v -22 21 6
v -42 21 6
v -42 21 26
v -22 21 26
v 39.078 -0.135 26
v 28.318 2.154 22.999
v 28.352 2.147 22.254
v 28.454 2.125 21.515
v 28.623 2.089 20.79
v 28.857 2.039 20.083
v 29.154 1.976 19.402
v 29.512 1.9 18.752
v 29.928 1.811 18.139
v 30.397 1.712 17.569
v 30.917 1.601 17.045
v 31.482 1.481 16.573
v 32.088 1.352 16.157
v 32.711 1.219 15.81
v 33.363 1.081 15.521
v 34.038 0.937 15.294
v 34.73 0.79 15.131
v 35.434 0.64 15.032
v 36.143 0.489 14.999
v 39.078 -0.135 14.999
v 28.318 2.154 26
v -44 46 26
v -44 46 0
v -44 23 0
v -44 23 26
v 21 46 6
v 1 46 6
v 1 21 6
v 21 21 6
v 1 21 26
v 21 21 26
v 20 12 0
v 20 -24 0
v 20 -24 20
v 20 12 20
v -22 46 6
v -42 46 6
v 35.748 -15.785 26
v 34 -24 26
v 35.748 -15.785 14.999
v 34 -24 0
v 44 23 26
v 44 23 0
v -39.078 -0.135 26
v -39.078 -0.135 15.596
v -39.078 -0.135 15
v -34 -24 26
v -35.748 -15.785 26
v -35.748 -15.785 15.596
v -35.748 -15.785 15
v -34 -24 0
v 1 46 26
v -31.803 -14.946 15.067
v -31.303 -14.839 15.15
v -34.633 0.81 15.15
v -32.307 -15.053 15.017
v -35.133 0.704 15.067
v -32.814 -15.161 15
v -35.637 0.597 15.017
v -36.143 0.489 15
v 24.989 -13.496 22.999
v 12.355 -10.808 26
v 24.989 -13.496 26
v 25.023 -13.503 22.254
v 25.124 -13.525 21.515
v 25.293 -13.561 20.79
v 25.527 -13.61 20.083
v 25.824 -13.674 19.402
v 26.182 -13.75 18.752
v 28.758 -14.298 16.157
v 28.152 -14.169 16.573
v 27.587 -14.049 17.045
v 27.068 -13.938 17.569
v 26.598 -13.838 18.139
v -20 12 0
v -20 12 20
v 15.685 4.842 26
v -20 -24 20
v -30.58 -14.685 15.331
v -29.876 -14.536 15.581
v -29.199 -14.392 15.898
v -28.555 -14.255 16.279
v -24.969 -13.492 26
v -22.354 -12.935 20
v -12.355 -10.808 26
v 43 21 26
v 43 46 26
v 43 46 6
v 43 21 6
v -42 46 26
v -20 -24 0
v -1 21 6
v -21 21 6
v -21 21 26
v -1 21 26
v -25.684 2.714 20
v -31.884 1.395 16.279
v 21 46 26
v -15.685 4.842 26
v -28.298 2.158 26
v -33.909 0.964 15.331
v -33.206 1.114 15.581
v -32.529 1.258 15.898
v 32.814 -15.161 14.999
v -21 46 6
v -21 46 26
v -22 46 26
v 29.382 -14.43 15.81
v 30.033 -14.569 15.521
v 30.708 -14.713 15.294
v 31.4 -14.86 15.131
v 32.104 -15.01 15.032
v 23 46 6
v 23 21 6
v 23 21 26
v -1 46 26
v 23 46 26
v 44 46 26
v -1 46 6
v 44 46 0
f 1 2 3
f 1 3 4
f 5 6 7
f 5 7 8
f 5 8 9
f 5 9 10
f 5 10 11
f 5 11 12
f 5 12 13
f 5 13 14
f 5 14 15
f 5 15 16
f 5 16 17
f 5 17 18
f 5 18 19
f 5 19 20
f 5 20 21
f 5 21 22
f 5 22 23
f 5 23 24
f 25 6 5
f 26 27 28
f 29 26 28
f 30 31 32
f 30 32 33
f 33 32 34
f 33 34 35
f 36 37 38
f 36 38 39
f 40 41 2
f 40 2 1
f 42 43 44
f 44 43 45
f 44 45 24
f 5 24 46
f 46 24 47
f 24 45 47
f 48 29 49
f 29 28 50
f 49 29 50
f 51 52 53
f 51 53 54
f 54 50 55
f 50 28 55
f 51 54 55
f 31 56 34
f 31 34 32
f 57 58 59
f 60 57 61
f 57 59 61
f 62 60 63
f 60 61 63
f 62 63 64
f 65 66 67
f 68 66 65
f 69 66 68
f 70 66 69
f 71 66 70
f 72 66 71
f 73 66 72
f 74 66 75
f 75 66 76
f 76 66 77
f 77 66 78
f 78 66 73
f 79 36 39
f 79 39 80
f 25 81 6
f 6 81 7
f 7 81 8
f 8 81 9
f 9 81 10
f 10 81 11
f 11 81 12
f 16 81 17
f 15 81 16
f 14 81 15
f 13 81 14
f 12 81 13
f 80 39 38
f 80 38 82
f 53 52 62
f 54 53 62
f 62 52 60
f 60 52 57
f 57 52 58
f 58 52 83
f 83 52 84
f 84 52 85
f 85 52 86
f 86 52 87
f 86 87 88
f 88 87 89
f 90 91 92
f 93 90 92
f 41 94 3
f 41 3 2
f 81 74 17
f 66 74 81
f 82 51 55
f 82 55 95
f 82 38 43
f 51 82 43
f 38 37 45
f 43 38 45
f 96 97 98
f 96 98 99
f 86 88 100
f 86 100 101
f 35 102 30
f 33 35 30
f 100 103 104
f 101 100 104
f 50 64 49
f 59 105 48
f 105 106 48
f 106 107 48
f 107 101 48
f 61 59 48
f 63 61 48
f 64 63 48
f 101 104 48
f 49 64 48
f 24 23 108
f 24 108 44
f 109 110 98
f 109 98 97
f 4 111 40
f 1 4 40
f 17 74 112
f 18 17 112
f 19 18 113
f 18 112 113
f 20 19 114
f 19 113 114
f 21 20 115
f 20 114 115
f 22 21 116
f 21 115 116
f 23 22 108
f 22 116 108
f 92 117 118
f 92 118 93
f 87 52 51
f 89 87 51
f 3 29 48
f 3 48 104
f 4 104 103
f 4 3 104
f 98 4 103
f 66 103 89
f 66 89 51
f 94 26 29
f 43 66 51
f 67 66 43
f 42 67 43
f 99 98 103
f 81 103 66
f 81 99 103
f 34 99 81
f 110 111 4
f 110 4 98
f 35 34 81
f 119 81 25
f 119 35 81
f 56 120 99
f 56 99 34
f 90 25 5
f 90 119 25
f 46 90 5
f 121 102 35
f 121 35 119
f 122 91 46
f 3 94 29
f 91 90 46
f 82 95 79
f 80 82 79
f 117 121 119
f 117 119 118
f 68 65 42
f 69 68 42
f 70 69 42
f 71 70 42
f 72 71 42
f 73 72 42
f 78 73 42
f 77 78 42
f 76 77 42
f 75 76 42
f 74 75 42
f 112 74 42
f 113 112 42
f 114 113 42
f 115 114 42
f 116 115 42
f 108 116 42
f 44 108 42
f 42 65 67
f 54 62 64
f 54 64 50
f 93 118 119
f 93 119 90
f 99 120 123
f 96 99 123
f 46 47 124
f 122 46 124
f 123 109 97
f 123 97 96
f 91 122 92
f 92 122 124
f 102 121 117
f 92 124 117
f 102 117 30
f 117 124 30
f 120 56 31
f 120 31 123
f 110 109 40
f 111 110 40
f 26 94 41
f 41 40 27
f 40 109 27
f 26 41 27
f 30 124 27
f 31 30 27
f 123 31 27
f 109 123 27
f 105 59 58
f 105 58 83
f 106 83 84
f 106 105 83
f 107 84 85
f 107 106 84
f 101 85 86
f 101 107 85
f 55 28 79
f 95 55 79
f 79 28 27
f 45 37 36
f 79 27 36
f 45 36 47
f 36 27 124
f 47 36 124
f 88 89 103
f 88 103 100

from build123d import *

# Parameters (mm, degrees)
EXTRUDE_1_DEPTH     = 26
SKETCH_3_W          = 40
SKETCH_3_H          = 36
CUT_EXTRUDE_4_DEPTH = 20
SKETCH_4_W          = 20
SKETCH_4_H          = 20
CUT_EXTRUDE_5_DEPTH = 25
CUT_EXTRUDE_3_DEPTH = 8
CUT_EXTRUDE_6_DEPTH = 8
CUT_EXTRUDE_7_DEPTH = 16
CUT_EXTRUDE_8_DEPTH = 16


with BuildPart() as part:
    # 草图1 → 凸台-拉伸1 (new body)
    with BuildSketch(Plane.XY):
        Polygon((-34, -24), (34, -24), (44, 23), (44, 46), (-44, 46), (-44, 23), align=None)
    extrude(amount=EXTRUDE_1_DEPTH)

    # 草图3 → 切除-拉伸4 (cut)
    with BuildSketch(Plane(origin=(0, 0, 0), x_dir=(-1, 0, 0), z_dir=(0, 0, -1))):
        with Locations((0, -6)):
            Rectangle(SKETCH_3_W, SKETCH_3_H)
    extrude(amount=-CUT_EXTRUDE_4_DEPTH, mode=Mode.SUBTRACT)

    # 草图4 → 切除-拉伸5 (cut)
    with BuildSketch(Plane(origin=(0, 46, 0), x_dir=(1, 0, 0), z_dir=(0, 1, 0))):
        with Locations((33, -16)):
            Rectangle(SKETCH_4_W, SKETCH_4_H)
        with Locations((11, -16)):
            Rectangle(SKETCH_4_W, SKETCH_4_H)
        with Locations((-11, -16)):
            Rectangle(SKETCH_4_W, SKETCH_4_H)
        with Locations((-32, -16)):
            Rectangle(SKETCH_4_W, SKETCH_4_H)
    extrude(amount=-CUT_EXTRUDE_5_DEPTH, mode=Mode.SUBTRACT)

    # Sketch 3D_5 → 切除-拉伸3 (cut, symmetric)
    with BuildSketch(Plane(origin=(-26.633413551, -5.666683734, 23.004025099), x_dir=(-0.691625335103945, -0.14715432661786076, 0.7071067811865475), z_dir=(-0.2081076444648591, 0.9781059289848354, 0))):
        with BuildLine():
            Line((0, 0), (5.656854249, 5.656854249))
            Line((5.656854249, 5.656854249), (11.313708499, 0))
            ThreePointArc((11.313708499, 0), (5.656854249, -13.656854249), (0, 0))
        make_face()
    extrude(amount=CUT_EXTRUDE_3_DEPTH, both=True, mode=Mode.SUBTRACT)

    # Sketch 3D_6 → 切除-拉伸6 (cut, symmetric)
    with BuildSketch(Plane(origin=(34.478414998, -7.335832978, 14.99907516), x_dir=(0.5895982688198705, -0.12544644017993214, 0.7978954016979886), z_dir=(-0.20810764446495697, -0.9781059289848145, -6.6559639472978385e-12))):
        with BuildLine():
            Line((0, 0), (6.376045072, -8.439700449))
            Line((6.376045072, -8.439700449), (17.547318622, 0))
            Line((17.547318622, 0), (11.17127355, 8.439700449))
            Line((11.17127355, 8.439700449), (6.348906145, 14.822863662))
            Line((6.348906145, 14.822863662), (1.560795809, 11.205530619))
            ThreePointArc((1.560795809, 11.205530619), (-1.540343474, 5.926016705), (0, 0))
        make_face()
    extrude(amount=CUT_EXTRUDE_6_DEPTH, both=True, mode=Mode.SUBTRACT)

    # 草图7 → 切除-拉伸7 (cut)
    with BuildSketch(Plane(origin=(-1.664861156, 7.824847432, 0), x_dir=(0.9781059289848355, 0.2081076444648587, 0), z_dir=(0.2081076444648587, -0.9781059289848355, 0))):
        with BuildLine():
            Line((-24.556702047, 20), (-31.200844281, 16.10051891))
            ThreePointArc((-31.200844281, 16.10051891), (-33.152072653, 15.280030806), (-35.250185053, 15))
            Line((-35.250185053, 15), (-43.250185053, 15))
            Line((-43.250185053, 15), (-43.250185053, 23))
            ThreePointArc((-43.250185053, 23), (-40.3181561, 29.189965223), (-33.671267687, 30.842641134))
            Line((-33.671267687, 30.842641134), (-10.087245225, 28.492198282))
            Line((-10.087245225, 28.492198282), (-24.556702047, 20))
        make_face()
    extrude(amount=CUT_EXTRUDE_7_DEPTH, mode=Mode.SUBTRACT)

    # 草图11 → 切除-拉伸8 (cut)
    with BuildSketch(Plane(origin=(-1.664861156, -7.824847432, 0), x_dir=(0.9781059289845859, -0.2081076444660318, -1.1269708570671002e-12), z_dir=(0.20810764446603178, 0.9781059289845858, 5.296763028184159e-12))):
        with BuildLine():
            Line((31.200844283, -16.100518909), (14.333584528, -26))
            Line((14.333584528, -26), (32.666556858, -30.571318601))
            ThreePointArc((32.666556858, -30.571318601), (42.196349228, -26.968728166), (40.460809076, -16.92962956))
            Line((40.460809076, -16.92962956), (38.250185053, -14.99907516))
            Line((38.250185053, -14.99907516), (35.250185053, -15))
            ThreePointArc((35.250185053, -15), (33.152072655, -15.280030806), (31.200844283, -16.100518909))
        make_face()
    extrude(amount=CUT_EXTRUDE_8_DEPTH, mode=Mode.SUBTRACT)


solid = part.part
